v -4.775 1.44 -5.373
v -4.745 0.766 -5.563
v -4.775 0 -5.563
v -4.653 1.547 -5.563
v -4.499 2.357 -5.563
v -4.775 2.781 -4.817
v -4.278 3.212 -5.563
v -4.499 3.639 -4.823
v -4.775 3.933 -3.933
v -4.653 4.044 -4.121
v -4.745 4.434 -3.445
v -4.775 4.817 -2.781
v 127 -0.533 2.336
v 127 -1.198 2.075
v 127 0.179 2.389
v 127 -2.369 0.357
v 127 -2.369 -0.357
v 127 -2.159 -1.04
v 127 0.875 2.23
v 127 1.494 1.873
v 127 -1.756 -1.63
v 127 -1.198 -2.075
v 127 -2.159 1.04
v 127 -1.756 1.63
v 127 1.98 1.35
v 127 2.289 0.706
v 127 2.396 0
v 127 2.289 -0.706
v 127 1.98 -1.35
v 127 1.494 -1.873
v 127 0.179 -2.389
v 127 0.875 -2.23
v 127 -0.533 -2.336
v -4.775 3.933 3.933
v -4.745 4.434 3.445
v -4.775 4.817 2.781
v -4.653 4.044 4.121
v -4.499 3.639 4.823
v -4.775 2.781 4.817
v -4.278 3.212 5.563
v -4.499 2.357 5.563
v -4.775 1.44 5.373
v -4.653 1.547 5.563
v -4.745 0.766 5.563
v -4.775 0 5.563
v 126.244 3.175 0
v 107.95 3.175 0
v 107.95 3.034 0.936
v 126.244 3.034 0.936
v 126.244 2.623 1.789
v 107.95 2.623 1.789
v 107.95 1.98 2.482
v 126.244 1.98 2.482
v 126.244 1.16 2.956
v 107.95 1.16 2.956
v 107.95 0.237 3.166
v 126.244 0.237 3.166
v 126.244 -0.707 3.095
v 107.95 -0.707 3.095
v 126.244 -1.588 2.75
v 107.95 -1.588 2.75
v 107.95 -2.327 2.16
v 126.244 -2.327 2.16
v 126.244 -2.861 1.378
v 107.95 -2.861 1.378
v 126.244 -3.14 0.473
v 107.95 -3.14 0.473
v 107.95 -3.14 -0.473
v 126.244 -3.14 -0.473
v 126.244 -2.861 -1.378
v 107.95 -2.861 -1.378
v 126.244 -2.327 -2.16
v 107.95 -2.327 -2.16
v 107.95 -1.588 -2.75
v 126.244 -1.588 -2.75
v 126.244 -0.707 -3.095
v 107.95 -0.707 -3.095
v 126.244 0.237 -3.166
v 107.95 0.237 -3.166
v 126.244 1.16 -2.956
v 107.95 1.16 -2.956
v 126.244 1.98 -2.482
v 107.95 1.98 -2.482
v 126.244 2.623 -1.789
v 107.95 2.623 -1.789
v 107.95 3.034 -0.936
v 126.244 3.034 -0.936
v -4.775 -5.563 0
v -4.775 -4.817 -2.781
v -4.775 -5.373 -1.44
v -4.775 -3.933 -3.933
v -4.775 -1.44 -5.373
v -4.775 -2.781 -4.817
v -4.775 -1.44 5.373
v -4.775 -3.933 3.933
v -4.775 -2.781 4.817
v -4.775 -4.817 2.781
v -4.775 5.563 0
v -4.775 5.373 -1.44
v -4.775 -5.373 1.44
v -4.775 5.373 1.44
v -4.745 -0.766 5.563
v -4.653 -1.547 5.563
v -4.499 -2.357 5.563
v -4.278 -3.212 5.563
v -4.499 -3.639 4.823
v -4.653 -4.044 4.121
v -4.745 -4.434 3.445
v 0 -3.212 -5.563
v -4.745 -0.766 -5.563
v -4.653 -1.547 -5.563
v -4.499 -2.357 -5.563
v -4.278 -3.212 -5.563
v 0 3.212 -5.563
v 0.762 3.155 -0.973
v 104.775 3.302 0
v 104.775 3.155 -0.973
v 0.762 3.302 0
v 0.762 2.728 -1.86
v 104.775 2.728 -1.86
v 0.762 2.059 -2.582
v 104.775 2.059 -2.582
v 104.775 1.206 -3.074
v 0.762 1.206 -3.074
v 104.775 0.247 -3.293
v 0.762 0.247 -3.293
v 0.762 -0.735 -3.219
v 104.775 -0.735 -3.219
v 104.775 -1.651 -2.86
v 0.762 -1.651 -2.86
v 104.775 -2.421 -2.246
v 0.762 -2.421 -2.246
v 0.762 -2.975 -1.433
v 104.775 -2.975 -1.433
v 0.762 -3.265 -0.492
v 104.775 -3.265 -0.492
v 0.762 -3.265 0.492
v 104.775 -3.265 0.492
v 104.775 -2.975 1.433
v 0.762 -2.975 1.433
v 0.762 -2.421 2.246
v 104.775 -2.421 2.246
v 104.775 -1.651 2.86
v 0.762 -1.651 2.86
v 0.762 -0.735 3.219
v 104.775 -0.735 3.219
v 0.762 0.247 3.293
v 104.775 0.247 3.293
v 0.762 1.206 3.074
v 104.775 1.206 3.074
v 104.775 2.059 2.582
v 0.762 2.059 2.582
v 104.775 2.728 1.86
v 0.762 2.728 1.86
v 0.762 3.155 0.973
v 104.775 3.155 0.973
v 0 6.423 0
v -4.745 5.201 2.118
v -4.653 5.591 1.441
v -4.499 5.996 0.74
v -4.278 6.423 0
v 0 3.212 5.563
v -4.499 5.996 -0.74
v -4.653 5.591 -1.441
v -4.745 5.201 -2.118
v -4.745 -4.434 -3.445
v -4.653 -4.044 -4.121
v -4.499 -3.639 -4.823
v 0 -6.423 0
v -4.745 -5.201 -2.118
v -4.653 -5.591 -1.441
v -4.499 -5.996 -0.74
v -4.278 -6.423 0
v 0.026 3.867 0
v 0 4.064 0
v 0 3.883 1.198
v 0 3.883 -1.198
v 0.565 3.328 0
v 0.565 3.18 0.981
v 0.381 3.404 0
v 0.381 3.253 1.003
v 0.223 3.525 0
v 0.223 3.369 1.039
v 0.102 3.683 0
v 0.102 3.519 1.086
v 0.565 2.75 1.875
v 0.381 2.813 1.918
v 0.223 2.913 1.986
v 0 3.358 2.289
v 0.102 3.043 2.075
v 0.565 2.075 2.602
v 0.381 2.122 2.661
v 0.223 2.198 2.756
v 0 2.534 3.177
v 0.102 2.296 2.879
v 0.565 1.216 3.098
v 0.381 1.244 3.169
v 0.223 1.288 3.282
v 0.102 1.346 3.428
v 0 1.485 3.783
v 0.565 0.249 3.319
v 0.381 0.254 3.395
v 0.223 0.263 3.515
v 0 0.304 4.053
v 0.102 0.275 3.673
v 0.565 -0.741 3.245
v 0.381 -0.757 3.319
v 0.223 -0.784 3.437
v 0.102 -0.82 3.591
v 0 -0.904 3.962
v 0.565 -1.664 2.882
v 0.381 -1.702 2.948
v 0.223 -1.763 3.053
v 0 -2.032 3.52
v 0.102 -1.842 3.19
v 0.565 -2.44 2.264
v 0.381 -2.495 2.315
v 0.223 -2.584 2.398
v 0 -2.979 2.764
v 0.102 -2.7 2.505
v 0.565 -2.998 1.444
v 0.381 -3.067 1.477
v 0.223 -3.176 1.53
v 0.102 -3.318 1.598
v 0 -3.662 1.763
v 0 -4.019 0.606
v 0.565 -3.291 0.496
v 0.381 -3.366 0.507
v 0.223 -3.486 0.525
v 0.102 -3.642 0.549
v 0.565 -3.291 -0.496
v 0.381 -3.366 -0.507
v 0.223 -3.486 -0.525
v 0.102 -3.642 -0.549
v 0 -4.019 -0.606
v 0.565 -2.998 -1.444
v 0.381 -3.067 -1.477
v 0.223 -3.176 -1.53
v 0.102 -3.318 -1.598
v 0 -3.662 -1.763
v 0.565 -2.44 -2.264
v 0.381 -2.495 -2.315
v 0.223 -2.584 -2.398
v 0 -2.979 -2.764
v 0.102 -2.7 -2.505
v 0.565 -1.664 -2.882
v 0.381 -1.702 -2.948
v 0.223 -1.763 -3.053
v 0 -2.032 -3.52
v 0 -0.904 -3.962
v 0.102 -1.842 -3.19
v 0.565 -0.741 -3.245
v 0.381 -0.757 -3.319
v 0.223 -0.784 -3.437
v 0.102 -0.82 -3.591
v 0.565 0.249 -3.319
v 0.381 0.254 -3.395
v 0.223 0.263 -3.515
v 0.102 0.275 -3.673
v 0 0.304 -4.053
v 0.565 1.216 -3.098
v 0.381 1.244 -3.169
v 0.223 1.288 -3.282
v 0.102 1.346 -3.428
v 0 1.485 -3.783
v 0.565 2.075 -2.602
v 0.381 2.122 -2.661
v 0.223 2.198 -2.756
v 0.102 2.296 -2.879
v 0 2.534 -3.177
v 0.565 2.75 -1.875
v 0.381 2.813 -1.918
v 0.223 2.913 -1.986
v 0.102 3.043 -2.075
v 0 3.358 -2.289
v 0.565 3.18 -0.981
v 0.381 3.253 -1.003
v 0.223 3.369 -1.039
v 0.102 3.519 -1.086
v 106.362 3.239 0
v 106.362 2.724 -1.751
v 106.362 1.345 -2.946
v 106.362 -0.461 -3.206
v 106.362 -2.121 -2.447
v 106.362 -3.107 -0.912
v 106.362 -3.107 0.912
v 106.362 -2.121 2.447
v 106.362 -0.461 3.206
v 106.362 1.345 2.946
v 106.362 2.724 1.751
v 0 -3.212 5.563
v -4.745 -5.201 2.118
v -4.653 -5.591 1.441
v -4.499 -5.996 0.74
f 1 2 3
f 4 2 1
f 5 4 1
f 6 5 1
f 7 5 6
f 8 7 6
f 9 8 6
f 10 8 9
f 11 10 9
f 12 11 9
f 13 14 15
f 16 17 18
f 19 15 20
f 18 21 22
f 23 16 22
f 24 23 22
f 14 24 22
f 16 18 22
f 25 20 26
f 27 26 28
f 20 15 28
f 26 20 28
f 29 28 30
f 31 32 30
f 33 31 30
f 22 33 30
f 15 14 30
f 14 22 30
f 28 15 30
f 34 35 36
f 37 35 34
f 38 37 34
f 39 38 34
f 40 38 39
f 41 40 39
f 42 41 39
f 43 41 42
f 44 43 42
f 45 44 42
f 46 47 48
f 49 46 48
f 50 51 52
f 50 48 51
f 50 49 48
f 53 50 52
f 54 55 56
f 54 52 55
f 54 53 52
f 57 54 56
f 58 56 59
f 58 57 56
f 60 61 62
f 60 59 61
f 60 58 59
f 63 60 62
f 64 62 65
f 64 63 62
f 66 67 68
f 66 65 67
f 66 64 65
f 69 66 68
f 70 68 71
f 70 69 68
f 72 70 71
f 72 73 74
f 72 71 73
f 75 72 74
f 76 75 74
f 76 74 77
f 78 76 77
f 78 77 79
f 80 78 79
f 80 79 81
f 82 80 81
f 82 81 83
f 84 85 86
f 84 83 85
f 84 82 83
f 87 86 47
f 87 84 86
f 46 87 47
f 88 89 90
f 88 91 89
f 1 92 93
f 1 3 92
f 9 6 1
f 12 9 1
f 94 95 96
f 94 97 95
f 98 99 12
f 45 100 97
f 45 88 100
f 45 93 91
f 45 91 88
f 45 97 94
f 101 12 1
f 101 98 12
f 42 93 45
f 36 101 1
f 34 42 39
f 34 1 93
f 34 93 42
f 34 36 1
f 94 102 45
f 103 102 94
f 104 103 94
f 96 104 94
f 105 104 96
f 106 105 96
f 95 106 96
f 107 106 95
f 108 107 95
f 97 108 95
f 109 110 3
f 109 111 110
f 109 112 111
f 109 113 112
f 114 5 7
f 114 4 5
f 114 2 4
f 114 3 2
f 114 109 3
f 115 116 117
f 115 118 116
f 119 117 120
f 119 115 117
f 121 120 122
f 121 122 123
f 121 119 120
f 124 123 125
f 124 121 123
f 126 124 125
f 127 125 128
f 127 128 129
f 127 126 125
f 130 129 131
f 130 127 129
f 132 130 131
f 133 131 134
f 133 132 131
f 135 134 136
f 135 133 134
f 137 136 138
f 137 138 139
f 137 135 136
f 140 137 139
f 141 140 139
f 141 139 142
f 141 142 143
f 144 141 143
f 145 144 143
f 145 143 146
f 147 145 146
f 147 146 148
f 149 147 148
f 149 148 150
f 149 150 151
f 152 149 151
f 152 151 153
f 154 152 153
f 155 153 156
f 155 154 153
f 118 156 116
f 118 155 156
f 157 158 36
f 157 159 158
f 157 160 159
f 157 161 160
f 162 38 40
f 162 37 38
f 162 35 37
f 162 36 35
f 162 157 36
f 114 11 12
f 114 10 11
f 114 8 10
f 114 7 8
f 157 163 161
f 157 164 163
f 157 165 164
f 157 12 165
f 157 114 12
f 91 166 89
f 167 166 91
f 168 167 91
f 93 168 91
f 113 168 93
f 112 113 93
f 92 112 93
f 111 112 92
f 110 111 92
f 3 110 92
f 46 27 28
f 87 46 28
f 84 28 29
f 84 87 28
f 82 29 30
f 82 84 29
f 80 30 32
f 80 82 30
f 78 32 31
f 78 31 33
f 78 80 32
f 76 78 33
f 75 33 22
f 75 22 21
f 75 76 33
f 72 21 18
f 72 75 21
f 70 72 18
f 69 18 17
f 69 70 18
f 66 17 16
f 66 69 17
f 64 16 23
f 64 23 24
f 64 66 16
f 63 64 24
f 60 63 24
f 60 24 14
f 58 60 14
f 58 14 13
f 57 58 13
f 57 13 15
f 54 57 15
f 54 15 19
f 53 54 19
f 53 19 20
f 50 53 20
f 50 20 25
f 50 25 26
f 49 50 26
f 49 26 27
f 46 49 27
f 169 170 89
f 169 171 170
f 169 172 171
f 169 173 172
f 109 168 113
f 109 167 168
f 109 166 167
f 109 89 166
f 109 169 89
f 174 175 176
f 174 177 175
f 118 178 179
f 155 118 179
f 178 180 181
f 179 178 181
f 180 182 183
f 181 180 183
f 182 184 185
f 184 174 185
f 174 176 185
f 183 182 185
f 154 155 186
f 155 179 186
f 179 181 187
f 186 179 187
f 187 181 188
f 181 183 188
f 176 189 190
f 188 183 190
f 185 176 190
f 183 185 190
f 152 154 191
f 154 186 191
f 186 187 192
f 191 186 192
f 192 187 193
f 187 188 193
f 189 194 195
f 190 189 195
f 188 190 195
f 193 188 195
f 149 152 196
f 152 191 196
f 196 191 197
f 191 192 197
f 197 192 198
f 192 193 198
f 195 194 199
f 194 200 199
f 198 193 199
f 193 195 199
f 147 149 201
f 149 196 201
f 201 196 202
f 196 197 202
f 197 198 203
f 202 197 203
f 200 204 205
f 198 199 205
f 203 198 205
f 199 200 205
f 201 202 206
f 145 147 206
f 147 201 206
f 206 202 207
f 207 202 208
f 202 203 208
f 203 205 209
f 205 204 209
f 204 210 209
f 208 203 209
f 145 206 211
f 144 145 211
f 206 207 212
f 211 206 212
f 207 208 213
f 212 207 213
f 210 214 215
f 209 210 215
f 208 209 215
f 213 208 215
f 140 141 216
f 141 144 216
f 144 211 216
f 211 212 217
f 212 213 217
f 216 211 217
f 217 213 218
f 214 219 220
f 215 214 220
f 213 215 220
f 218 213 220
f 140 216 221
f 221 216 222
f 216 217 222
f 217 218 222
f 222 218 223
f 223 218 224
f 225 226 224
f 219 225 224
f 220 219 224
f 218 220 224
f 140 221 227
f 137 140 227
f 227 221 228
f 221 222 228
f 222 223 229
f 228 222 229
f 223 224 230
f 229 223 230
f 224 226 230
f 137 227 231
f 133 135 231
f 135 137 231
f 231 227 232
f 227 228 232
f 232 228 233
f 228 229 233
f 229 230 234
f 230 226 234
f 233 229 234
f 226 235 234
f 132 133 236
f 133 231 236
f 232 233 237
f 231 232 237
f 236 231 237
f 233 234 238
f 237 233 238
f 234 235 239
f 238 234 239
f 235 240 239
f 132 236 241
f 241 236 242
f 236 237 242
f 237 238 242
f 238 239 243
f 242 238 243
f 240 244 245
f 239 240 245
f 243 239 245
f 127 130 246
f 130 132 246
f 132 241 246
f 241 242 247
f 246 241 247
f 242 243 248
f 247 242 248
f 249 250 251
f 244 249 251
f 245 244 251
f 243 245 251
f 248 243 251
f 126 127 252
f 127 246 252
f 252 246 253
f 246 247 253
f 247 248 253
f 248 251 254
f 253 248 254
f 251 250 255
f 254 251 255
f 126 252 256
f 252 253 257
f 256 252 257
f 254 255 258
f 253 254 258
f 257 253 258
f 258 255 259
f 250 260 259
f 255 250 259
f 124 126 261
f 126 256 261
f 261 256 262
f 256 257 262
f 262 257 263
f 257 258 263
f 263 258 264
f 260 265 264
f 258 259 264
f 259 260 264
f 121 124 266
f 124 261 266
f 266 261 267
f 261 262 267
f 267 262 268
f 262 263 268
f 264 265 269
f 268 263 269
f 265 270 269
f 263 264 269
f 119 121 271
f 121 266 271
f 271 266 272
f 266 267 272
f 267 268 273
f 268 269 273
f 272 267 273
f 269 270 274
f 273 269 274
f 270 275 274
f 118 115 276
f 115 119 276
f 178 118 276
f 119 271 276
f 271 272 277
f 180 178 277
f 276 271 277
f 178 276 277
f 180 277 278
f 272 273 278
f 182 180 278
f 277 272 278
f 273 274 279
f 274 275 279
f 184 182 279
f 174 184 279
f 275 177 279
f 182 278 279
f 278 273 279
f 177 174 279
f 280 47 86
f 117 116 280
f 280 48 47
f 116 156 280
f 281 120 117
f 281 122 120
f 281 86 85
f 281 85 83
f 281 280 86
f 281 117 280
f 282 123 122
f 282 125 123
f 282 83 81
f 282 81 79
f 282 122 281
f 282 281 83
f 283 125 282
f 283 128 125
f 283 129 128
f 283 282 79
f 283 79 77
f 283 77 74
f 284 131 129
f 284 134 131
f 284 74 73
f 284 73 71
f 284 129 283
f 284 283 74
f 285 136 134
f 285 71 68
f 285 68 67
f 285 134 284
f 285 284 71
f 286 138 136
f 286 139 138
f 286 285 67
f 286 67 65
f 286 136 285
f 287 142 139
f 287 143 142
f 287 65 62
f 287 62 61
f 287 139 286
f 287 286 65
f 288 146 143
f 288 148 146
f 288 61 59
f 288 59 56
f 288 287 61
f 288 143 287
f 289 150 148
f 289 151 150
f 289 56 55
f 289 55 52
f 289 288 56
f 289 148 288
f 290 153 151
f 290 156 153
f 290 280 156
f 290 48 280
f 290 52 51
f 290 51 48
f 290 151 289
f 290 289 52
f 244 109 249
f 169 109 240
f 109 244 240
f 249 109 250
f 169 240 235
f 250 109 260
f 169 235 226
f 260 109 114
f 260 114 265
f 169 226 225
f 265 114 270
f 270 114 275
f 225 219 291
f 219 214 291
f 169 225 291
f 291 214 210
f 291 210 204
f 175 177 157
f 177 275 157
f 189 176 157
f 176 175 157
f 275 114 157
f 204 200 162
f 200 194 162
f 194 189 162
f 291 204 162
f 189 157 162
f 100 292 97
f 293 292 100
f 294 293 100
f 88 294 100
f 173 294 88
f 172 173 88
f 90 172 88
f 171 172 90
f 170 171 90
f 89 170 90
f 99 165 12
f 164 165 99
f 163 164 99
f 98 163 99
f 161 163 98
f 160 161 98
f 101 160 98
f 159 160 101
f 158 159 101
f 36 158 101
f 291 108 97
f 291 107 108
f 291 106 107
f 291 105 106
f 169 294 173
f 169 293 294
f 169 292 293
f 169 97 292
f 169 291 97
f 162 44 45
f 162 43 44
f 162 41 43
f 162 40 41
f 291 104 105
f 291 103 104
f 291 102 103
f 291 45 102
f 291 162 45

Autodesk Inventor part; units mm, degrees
ref_plane "YZ Plane" through (0, 0, 0) normal (1, 0, 0) x (0, 1, 0)
ref_plane "XZ Plane" through (0, 0, 0) normal (0, 1, 0) x (-1, 0, 0)
sketch "Sketch1" plane through (0, 0, 0) normal (0, 0, 1) x (1, 0, 0)
  line L0 (0, 5.5626) -> (0, 3.302)
  line L1 (107.95, 3.175) -> (127, 3.175)
  line L2 (127, 3.175) -> (127, 0)
  line L3 (127, 0) -> (-0.0001, 0)
  line L4 (-25.4001, 0) -> (152.4, 0) projected
  line L5 (-0.0001, 0) -> (-0.0001, 5.5626)
  line L6 (-0.0001, 5.5626) -> (0, 5.5626)
  line L7 (107.95, 3.175) -> (104.7749, 3.302)
  line L8 (104.7749, 3.302) -> (0, 3.302)
  line L9 (0, -1.1125) -> (0, 6.6751) projected
  dimension "d0" = 127
  dimension "d1" = 19.05
  dimension "d2" = 6.35
  dimension "d9" = 0.0001
  dimension "d10" = 11.1252
  dimension "d13" = 3.1751
  dimension "d14" = 6.604
revolve "Body" add sketch "Sketch1" angle 360 about axis through (127, 0, 0) along (-1, 0, 0)
sketch "Sketch2" plane through (-0.0001, 0, 0) normal (-1, 0, 0) x (0, 0, 1)
  line L0 (0, 6.4231) -> (5.5626, 3.2116)
  line L1 (5.5626, 3.2116) -> (5.5626, -3.2116)
  line L2 (5.5626, -3.2116) -> (0, -6.4231)
  line L3 (0, -6.4231) -> (-5.5626, -3.2116)
  line L4 (-5.5626, -3.2116) -> (-5.5626, 3.2116)
  line L5 (-5.5626, 3.2116) -> (0, 6.4231)
  point P0 (0, 0)
  point P1 (0, 0)
  dimension "d11" = 11.1252
extrude "Head" add sketch "Sketch2" along normal blind 4.7752
sketch "Sketch4" plane through (0, 0, 0) normal (0, 0, 1) x (1, 0, 0)
  line L0 (-4.7753, 5.5626) -> (-4.7753, 6.4231)
  line L1 (-4.7753, 6.4231) -> (-4.2785, 6.4231)
  line L2 (-4.2785, 6.4231) -> (-4.7753, 5.5626)
  line L3 (-5.7303, 0) -> (0.9549, 0) projected
  line L4 (-0.0001, 6.4231) -> (-4.7753, 6.4231) projected
  line L5 (-4.7753, 3.2116) -> (-4.7753, 6.4231) projected
  dimension "d5" = 30
  dimension "d19" = 11.1252
revolve "Chamfer1" cut sketch "Sketch4" angle 360 about axis through (-10, 0, 0) along (1, 0, 0)
thread "Thread" size "1/4-20 UNC" class "2A" standard "ANSI Unified Screw Threads" length 19.05
chamfer "Chamfer2" distance 0.7791 distance2 0.7557 1 edges at (127, -3.175, 0) measured on face at (127, -0.5202, 1.1995)
ref_plane "Work Plane1" through (1.525, 0, 0) normal (0, 0, 1) x (1, 0, 0)
fillet "Fillet2" radius 0.762 1 edges at (0, -3.302, 0)
equation "\"d0\" = NLG"
equation "\"d1\" = GEL"
equation "\"d2\" = GD"
equation "\"d10\" = SD2"
equation "\"d14\" = BDM"
equation "\"d11\" = SW"
equation "\"d3\" = KOH - SD"
equation "\"d5\" = ANG1"
equation "\"d19\" = SW0"
equation "\"d63\" = R"
equation "\"d15\" = GEL"
equation "\"d6\" = -0.5 * SPD + 0.5 * GD"
equation "\"NLG\" = 127"
equation "\"GD\" = NND"
equation "\"BDM\" = 6.604"
equation "\"KOH\" = 4.7752"
equation "\"GEL\" = 19.05"
equation "\"SW\" = 11.1252"
equation "\"SW0\" = SW"
equation "\"SPD\" = GD1"
equation "\"SD2\" = SW"
equation "\"SD\" = 0"
equation "\"ANG1\" = 30deg"
equation "\"GAL\" = 3.175"
equation "\"GUL\" = 0.238 * GAL"
equation "\"R\" = 0.762"
equation "\"d62\" = -NLG - SD + GUL"
equation "\"GD1\" = 4.79184"
equation "\"THREADDIA\" = 6.35"
equation "\"TOA\" = 30deg"
equation "\"NND\" = 6.35"
equation "\"E0\" = 1.155 * SW"
properties part number "ANSI/ASME B18.2.1 - 1/4-20 UNC - 5" material "Steel, Mild"
